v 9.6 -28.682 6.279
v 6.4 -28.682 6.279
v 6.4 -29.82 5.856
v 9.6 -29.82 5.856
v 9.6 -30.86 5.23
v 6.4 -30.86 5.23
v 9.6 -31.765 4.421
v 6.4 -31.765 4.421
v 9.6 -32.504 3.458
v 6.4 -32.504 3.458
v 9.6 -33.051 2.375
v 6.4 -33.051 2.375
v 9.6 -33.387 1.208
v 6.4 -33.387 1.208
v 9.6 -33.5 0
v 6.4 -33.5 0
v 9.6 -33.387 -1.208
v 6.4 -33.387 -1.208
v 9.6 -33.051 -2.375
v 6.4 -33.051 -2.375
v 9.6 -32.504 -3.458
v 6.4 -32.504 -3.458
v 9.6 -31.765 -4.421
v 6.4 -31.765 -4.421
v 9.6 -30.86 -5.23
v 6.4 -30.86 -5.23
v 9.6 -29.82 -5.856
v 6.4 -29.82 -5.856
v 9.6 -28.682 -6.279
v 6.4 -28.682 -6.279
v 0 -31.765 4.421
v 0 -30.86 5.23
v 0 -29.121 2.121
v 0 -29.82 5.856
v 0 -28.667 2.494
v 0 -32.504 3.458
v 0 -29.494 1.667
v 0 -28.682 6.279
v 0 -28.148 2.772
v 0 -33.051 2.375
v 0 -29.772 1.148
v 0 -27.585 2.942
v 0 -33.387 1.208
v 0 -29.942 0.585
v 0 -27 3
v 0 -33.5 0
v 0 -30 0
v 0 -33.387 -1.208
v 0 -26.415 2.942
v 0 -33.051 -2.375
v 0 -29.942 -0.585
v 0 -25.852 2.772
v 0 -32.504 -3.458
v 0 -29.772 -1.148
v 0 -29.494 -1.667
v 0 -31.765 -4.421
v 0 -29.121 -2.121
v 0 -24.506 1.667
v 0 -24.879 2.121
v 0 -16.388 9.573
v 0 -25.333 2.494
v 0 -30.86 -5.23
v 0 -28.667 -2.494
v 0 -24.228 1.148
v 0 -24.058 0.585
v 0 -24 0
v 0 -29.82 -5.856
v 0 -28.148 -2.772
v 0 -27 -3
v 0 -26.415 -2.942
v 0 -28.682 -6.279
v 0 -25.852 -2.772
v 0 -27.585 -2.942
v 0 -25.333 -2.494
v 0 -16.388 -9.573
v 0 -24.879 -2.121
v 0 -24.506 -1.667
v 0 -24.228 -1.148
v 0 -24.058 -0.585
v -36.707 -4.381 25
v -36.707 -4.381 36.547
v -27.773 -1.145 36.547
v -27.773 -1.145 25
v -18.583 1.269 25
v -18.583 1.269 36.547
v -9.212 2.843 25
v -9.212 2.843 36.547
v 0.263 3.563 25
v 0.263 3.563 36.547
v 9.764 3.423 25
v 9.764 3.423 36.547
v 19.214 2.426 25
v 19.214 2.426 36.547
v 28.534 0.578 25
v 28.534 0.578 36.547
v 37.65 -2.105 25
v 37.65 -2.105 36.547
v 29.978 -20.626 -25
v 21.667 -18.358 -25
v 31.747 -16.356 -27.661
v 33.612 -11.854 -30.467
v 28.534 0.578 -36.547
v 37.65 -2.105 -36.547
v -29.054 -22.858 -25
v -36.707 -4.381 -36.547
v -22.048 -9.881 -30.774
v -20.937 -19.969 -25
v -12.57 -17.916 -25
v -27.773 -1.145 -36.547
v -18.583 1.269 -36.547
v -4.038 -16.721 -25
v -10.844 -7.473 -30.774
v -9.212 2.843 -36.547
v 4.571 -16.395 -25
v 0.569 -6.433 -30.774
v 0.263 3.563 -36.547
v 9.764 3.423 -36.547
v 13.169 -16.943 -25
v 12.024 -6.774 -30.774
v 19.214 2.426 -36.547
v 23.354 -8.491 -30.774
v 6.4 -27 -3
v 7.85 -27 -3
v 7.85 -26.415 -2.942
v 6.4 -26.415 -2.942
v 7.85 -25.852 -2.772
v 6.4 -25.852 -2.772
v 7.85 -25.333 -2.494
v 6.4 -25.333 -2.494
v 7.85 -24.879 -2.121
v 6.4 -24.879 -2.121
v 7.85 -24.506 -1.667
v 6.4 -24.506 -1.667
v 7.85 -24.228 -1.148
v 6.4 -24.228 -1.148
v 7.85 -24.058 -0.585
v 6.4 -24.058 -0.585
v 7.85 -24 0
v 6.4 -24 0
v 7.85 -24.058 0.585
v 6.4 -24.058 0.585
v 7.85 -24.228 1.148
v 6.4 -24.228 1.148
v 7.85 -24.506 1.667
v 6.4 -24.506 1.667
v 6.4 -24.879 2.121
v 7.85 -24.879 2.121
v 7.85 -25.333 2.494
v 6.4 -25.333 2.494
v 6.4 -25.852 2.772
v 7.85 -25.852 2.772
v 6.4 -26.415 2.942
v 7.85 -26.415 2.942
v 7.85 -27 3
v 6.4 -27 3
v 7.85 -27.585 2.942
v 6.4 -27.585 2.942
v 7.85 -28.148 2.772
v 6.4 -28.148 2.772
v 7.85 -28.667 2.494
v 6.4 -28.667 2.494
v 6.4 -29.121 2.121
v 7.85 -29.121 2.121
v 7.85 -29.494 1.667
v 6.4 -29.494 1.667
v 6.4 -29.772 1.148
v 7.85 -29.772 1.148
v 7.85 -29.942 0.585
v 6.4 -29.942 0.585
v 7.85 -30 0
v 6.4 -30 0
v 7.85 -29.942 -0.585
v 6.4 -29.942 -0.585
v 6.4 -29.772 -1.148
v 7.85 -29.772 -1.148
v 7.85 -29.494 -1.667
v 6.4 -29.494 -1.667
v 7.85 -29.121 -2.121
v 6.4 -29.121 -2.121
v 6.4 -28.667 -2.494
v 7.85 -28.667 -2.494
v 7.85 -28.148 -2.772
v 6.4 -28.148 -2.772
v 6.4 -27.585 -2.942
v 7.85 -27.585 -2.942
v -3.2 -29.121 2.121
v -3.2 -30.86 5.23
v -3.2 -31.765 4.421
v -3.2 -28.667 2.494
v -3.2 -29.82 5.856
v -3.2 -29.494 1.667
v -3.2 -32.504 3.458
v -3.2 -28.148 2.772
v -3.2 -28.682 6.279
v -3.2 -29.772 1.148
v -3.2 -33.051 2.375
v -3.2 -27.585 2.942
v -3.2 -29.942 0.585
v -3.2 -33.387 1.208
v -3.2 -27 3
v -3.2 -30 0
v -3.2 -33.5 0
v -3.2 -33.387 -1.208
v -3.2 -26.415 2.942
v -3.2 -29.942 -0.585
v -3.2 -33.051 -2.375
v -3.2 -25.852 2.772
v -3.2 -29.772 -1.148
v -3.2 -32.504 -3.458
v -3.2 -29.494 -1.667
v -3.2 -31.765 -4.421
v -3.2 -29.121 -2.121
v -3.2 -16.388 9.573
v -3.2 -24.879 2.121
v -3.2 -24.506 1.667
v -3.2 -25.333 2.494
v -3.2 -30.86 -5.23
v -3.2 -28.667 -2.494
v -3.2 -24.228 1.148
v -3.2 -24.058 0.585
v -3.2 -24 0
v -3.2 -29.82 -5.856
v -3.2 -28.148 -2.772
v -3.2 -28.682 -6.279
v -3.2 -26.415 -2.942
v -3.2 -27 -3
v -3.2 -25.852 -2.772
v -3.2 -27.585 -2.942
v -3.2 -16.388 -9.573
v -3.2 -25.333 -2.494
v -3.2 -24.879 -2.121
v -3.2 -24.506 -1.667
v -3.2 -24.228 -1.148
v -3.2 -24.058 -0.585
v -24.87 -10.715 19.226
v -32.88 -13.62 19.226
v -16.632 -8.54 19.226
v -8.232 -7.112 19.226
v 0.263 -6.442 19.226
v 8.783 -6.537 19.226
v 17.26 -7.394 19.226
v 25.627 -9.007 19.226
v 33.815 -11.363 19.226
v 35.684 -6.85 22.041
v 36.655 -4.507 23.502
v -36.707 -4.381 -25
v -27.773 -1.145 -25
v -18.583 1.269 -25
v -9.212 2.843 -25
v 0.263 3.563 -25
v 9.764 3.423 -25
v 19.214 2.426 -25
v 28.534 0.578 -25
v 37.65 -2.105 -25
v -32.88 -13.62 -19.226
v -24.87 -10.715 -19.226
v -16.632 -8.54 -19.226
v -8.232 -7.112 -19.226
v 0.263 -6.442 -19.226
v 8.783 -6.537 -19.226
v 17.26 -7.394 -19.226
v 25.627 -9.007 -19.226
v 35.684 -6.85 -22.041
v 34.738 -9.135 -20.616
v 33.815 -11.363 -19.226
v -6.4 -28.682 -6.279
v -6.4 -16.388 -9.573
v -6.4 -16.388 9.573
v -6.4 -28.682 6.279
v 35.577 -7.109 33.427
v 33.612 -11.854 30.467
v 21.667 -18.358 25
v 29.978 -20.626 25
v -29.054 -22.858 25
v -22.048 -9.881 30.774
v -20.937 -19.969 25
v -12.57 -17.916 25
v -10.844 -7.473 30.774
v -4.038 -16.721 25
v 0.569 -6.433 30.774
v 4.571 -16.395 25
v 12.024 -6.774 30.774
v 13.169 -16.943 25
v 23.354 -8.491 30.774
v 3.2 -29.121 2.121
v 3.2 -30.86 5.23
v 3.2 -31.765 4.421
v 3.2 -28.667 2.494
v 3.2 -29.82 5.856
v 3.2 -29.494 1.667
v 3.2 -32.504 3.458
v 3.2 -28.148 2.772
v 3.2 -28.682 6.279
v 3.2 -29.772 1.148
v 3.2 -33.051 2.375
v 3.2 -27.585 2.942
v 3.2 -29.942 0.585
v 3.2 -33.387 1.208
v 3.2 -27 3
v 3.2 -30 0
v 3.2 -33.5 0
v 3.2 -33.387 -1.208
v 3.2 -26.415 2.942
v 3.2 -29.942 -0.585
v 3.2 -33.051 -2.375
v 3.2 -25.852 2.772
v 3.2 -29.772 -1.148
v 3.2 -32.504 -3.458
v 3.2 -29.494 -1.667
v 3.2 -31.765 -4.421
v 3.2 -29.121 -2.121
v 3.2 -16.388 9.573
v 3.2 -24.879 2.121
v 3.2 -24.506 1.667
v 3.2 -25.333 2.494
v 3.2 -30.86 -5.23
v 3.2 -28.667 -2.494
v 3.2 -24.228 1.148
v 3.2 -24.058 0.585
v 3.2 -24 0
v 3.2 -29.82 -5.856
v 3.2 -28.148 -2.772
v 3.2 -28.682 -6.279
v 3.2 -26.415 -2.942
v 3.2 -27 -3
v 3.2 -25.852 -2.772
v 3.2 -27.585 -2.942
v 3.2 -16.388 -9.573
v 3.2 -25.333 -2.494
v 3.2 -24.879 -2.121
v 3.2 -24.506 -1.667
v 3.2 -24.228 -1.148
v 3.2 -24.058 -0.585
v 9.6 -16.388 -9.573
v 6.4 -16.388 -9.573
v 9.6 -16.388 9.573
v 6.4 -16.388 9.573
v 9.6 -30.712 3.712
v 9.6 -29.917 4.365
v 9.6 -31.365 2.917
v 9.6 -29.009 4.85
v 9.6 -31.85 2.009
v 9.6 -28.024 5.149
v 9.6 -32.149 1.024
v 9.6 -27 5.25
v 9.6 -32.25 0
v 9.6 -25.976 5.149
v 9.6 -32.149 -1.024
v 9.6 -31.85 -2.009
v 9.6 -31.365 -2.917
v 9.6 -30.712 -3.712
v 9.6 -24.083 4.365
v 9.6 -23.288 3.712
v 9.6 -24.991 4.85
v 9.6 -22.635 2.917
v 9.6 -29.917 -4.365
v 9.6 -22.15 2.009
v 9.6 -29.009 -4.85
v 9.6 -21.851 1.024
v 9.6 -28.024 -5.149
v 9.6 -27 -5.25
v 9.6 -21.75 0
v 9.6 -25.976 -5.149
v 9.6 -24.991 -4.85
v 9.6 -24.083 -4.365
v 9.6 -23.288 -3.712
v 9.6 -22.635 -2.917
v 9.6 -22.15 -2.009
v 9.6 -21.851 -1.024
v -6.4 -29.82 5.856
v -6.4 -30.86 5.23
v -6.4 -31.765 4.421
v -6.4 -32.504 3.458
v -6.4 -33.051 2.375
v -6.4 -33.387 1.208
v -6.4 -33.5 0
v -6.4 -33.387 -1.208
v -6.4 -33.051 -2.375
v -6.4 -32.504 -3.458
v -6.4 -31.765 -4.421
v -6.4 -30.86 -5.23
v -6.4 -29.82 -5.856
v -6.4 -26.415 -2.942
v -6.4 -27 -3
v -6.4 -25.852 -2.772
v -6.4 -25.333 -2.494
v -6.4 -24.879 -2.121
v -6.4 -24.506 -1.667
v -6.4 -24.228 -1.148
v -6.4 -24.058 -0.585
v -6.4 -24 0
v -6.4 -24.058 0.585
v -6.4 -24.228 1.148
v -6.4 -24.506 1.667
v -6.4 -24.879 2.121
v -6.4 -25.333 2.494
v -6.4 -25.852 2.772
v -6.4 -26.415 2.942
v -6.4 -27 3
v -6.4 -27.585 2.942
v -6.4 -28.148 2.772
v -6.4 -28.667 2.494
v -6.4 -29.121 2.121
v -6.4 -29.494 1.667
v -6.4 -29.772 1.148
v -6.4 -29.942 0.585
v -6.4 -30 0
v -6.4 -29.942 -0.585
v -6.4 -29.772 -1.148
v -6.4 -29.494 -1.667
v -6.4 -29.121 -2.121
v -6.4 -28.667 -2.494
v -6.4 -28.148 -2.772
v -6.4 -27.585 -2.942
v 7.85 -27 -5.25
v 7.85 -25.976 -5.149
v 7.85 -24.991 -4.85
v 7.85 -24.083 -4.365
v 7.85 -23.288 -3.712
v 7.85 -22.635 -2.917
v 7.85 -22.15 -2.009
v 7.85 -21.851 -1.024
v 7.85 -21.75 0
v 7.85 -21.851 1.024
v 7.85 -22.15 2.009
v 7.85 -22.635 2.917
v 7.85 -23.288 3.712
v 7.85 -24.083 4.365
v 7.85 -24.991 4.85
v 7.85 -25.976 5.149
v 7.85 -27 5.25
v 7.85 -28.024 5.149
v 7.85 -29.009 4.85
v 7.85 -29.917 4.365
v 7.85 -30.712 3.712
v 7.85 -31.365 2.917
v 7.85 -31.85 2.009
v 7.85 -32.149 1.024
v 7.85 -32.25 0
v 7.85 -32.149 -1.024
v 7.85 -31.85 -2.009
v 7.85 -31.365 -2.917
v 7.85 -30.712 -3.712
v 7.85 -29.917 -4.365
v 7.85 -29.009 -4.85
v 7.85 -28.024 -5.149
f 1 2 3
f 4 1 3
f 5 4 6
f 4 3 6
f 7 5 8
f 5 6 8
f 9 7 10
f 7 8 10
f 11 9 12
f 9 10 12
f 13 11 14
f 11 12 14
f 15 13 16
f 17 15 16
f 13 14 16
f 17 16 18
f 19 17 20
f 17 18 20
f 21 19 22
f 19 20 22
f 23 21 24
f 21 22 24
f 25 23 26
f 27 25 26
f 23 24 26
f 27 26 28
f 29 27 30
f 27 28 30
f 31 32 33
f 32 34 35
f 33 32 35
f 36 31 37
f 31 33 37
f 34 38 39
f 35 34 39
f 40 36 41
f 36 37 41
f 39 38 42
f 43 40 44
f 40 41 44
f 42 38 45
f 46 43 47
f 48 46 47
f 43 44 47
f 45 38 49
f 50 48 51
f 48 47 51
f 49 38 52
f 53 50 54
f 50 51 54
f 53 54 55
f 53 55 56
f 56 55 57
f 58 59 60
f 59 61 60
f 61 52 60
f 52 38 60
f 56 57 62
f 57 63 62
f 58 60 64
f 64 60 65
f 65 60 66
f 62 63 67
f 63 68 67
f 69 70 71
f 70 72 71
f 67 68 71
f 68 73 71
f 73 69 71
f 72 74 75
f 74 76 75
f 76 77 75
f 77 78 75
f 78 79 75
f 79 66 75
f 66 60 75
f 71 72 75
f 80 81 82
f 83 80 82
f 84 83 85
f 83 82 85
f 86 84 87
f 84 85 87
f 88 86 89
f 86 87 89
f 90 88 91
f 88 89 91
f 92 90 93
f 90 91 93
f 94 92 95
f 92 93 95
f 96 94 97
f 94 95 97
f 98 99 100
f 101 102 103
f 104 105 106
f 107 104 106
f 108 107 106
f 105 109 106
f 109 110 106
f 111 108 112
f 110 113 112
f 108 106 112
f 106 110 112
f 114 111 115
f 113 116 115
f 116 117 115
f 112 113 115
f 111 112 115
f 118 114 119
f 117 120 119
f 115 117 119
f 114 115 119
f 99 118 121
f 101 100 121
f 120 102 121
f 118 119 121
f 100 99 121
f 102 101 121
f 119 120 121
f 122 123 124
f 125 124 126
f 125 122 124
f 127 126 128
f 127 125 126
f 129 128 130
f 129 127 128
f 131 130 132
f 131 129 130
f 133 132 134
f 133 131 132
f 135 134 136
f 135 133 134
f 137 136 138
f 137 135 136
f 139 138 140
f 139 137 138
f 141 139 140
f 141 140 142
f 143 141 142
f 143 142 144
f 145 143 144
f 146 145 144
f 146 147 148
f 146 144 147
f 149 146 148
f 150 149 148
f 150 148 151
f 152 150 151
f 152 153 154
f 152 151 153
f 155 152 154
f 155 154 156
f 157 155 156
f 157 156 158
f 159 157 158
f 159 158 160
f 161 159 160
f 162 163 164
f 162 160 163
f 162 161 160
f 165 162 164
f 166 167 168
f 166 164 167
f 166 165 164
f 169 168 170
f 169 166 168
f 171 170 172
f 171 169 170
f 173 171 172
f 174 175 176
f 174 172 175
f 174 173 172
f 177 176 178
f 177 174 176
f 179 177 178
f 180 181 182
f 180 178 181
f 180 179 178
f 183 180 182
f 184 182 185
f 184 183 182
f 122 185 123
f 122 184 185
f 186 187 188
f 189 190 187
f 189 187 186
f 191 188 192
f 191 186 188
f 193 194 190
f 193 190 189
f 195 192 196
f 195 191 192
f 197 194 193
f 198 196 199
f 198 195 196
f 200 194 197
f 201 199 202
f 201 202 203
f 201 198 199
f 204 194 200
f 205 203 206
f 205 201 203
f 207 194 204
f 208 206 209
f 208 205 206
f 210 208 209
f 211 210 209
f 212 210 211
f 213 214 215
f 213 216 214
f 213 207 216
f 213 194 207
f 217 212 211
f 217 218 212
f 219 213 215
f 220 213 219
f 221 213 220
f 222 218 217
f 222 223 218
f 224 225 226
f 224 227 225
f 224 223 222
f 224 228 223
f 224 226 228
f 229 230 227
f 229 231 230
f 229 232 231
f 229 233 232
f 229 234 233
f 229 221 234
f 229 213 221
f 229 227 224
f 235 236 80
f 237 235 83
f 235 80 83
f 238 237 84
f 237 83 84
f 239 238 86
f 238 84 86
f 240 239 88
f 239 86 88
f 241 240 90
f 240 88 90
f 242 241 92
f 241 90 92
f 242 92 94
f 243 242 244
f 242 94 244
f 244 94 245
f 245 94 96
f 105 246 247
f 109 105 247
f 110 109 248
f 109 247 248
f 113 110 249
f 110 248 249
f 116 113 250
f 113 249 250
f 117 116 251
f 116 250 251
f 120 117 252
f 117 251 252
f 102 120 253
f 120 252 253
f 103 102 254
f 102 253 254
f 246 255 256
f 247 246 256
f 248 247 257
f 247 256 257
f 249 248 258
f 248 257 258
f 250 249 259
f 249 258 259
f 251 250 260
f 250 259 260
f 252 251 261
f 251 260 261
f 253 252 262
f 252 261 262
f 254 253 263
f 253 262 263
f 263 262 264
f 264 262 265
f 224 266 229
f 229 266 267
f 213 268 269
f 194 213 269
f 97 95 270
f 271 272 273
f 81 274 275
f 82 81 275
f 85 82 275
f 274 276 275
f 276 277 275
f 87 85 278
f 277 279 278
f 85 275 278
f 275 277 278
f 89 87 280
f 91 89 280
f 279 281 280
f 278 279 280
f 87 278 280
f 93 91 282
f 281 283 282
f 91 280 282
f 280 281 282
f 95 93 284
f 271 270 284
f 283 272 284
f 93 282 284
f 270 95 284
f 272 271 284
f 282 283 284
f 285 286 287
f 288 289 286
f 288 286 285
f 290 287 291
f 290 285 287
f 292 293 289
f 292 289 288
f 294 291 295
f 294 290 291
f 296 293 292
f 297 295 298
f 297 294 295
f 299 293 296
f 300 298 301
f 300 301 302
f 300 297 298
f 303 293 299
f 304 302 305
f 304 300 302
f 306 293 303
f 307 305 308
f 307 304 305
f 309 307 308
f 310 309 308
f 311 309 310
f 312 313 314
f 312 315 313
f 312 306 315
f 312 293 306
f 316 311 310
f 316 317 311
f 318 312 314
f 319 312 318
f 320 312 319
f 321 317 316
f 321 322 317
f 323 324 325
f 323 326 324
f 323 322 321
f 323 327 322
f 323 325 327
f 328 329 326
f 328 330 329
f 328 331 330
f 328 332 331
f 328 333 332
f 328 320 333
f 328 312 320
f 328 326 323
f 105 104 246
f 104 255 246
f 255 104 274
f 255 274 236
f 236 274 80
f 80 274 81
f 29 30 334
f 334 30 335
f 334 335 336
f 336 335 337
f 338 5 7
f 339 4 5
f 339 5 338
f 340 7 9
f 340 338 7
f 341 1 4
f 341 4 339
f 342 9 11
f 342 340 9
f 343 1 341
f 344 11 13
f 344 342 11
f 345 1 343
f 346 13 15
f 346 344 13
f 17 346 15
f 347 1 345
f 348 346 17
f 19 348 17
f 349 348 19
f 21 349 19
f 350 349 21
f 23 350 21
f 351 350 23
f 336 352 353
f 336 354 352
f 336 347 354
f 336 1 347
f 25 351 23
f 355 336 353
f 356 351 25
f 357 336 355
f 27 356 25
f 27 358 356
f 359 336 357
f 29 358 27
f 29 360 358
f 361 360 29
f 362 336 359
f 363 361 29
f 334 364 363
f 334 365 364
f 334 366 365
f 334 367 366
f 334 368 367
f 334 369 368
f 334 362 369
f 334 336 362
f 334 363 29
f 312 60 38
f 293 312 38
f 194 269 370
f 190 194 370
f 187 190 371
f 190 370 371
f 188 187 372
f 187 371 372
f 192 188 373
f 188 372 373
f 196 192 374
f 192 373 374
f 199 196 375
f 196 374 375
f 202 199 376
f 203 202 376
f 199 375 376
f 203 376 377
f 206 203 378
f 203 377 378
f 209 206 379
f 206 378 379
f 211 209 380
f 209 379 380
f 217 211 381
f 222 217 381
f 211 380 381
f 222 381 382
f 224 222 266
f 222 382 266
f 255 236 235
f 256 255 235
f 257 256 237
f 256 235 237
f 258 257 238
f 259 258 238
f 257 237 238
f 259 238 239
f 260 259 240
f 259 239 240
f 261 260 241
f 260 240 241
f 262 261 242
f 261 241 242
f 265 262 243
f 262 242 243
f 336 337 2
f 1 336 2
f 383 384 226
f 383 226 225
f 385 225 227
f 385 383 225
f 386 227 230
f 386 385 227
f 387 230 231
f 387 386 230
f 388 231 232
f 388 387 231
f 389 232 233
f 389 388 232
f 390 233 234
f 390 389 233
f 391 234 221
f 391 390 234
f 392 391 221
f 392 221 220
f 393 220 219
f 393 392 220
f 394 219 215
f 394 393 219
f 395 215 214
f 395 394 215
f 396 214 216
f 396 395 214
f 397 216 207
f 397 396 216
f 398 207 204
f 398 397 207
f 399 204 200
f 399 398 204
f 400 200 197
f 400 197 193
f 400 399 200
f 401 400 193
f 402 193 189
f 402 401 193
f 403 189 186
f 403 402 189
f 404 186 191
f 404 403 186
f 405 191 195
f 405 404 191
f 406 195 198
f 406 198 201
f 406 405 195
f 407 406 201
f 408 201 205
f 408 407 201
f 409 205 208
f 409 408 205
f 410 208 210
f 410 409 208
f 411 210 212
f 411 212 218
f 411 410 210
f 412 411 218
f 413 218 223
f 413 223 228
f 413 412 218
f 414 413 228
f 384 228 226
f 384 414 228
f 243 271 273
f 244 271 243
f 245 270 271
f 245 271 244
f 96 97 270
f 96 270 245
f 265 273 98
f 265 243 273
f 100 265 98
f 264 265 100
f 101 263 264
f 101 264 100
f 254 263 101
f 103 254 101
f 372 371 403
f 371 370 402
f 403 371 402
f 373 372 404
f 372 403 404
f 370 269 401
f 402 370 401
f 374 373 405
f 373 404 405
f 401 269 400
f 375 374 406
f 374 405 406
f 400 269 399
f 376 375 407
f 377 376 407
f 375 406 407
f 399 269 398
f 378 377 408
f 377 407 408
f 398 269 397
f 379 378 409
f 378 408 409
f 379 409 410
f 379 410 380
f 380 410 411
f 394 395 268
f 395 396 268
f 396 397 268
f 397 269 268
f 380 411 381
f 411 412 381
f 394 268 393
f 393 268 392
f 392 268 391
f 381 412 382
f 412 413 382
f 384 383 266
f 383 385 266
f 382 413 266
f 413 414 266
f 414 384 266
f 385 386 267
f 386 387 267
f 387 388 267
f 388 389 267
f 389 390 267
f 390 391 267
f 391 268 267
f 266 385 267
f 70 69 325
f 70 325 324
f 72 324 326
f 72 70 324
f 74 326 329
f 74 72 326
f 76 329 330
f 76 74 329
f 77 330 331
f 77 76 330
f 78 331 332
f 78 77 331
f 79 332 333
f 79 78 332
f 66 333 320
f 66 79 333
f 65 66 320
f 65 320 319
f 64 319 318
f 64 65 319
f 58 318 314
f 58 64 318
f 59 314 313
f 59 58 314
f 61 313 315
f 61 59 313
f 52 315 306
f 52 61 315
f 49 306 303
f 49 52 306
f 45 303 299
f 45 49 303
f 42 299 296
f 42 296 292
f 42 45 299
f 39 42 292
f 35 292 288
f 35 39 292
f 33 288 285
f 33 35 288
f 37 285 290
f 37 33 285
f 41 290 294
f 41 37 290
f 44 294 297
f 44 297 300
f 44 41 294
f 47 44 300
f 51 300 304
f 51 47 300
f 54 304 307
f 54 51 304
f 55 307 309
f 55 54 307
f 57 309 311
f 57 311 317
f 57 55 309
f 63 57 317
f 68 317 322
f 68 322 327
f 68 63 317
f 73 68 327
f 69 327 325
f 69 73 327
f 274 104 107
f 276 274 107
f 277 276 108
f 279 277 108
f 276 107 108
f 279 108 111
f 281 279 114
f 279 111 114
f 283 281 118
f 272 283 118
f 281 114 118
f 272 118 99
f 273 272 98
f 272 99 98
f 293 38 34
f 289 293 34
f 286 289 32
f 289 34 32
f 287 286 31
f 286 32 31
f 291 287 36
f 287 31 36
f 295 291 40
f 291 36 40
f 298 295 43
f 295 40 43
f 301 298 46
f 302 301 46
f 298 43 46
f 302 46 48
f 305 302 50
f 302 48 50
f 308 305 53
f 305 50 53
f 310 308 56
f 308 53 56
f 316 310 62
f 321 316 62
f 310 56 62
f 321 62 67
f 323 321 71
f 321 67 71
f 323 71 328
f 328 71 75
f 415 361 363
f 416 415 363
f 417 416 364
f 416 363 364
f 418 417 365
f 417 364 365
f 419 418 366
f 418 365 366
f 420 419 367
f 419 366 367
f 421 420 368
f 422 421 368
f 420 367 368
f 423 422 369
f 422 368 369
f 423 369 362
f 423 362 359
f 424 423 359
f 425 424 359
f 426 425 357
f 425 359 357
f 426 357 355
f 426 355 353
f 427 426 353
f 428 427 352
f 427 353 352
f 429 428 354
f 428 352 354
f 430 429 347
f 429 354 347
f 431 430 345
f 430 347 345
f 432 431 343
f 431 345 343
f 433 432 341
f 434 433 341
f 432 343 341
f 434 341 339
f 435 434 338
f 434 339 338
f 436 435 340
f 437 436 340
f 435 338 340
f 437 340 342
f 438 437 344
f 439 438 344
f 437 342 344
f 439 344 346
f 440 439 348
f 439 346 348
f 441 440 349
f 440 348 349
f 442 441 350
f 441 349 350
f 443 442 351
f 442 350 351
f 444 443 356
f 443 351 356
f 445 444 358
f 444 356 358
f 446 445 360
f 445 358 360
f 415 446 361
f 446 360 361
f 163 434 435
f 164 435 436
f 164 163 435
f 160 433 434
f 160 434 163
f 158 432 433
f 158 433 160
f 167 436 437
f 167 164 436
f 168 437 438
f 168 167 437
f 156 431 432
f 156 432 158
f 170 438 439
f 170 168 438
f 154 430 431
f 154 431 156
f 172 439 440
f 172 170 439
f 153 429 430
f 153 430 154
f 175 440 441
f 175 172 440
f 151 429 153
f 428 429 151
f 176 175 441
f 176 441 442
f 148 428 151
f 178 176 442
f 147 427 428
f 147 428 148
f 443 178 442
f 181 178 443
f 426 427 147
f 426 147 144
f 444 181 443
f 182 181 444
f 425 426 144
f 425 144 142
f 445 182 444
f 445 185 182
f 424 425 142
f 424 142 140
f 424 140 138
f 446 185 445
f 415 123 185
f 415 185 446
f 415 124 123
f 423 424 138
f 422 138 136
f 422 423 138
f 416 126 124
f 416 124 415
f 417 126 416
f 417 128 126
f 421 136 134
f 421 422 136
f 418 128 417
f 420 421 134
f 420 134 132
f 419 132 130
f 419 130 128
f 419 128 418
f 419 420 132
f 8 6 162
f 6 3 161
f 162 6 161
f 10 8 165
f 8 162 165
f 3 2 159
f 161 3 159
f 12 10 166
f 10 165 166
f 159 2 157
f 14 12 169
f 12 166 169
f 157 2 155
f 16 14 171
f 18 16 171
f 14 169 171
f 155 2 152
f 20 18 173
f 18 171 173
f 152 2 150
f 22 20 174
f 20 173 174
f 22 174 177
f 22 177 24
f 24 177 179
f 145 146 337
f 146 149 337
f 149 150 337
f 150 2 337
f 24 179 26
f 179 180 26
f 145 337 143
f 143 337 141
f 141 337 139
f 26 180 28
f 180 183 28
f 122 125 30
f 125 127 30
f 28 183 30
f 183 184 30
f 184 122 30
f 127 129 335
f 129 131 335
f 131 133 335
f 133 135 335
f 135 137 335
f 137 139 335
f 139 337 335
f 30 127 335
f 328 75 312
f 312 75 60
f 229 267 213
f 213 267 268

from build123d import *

# Parameters (mm, degrees)
SKETCH5_W           = 90
SKETCH5_H           = 70
CUT_EXTRUDE1_DEPTH  = 81.467778105
SKETCH4_R           = 3
BOSS_EXTRUDE3_DEPTH = 3.2
SKETCH6_R           = 5.25
CUT_EXTRUDE2_DEPTH  = 1.75


with BuildPart() as part:
    # Sweep1: sweep along a path in Sketch3
    with BuildLine(Plane.XY) as sweep1_path:
        ThreePointArc((-32.880465325, -13.619534675), (3.47446075, -6.388090263), (39.829386824, -13.619534675))
    # Sketch2 → Sweep1 (sweep)
    with BuildSketch(Plane(origin=(-32.880465325, -13.619534675, 0), x_dir=(-0.3826834323650842, 0.9238795325112891, 0), z_dir=(0.9238795325112891, 0.3826834323650842, 0))):
        Polygon((0, 19.226497308), (0, -19.226497308), (10, -25), (10, -36.547005384), (-10, -25), (-10, 25), (10, 36.547005384), (10, 25), align=None)
    sweep(path=sweep1_path.line)

    # Sketch5 → Cut-Extrude1 (cut, through all)
    with BuildSketch(Plane(origin=(32.880465325, -13.619534675, 0), x_dir=(0, 0, -1), z_dir=(0.9238795325112837, -0.3826834323650971, 0))):
        Rectangle(SKETCH5_W, SKETCH5_H)
    extrude(amount=CUT_EXTRUDE1_DEPTH, mode=Mode.SUBTRACT)


with BuildPart() as body_2:
    # Sketch4 → Boss-Extrude3 (new body)
    with BuildSketch(Plane(origin=(0, 0, 3.2), x_dir=(0, 0, -1), z_dir=(1, 0, 0))):
        with BuildLine():
            Line((9.478517871, -28.682323793), (12.772747817, -16.388090263))
            Line((12.772747817, -16.388090263), (-6.372747817, -16.388090263))
            Line((-6.372747817, -16.388090263), (-3.078517871, -28.682323793))
            ThreePointArc((-3.078517871, -28.682323793), (3.2, -33.5), (9.478517871, -28.682323793))
        make_face()
        with Locations((3.2, -27)):
            Circle(SKETCH4_R, mode=Mode.SUBTRACT)
    extrude(amount=BOSS_EXTRUDE3_DEPTH)


with BuildPart() as body_3:
    # Body-Move/Copy1: copy of body 2
    add(body_2.part.moved(Location((6.4, 0, 0))))

    # Sketch6 → Cut-Extrude2 (cut)
    with BuildSketch(Plane(origin=(9.6, 0, 0), x_dir=(0, 0, -1), z_dir=(1, 0, 0))):
        with Locations((0, -27)):
            Circle(SKETCH6_R)
    extrude(amount=-CUT_EXTRUDE2_DEPTH, mode=Mode.SUBTRACT)


with BuildPart() as body_4:
    # Body-Move/Copy2: copy of body 2
    add(body_2.part.moved(Location((-6.4, 0, 0))))


solid = Compound([part.part, body_2.part, body_3.part, body_4.part])
